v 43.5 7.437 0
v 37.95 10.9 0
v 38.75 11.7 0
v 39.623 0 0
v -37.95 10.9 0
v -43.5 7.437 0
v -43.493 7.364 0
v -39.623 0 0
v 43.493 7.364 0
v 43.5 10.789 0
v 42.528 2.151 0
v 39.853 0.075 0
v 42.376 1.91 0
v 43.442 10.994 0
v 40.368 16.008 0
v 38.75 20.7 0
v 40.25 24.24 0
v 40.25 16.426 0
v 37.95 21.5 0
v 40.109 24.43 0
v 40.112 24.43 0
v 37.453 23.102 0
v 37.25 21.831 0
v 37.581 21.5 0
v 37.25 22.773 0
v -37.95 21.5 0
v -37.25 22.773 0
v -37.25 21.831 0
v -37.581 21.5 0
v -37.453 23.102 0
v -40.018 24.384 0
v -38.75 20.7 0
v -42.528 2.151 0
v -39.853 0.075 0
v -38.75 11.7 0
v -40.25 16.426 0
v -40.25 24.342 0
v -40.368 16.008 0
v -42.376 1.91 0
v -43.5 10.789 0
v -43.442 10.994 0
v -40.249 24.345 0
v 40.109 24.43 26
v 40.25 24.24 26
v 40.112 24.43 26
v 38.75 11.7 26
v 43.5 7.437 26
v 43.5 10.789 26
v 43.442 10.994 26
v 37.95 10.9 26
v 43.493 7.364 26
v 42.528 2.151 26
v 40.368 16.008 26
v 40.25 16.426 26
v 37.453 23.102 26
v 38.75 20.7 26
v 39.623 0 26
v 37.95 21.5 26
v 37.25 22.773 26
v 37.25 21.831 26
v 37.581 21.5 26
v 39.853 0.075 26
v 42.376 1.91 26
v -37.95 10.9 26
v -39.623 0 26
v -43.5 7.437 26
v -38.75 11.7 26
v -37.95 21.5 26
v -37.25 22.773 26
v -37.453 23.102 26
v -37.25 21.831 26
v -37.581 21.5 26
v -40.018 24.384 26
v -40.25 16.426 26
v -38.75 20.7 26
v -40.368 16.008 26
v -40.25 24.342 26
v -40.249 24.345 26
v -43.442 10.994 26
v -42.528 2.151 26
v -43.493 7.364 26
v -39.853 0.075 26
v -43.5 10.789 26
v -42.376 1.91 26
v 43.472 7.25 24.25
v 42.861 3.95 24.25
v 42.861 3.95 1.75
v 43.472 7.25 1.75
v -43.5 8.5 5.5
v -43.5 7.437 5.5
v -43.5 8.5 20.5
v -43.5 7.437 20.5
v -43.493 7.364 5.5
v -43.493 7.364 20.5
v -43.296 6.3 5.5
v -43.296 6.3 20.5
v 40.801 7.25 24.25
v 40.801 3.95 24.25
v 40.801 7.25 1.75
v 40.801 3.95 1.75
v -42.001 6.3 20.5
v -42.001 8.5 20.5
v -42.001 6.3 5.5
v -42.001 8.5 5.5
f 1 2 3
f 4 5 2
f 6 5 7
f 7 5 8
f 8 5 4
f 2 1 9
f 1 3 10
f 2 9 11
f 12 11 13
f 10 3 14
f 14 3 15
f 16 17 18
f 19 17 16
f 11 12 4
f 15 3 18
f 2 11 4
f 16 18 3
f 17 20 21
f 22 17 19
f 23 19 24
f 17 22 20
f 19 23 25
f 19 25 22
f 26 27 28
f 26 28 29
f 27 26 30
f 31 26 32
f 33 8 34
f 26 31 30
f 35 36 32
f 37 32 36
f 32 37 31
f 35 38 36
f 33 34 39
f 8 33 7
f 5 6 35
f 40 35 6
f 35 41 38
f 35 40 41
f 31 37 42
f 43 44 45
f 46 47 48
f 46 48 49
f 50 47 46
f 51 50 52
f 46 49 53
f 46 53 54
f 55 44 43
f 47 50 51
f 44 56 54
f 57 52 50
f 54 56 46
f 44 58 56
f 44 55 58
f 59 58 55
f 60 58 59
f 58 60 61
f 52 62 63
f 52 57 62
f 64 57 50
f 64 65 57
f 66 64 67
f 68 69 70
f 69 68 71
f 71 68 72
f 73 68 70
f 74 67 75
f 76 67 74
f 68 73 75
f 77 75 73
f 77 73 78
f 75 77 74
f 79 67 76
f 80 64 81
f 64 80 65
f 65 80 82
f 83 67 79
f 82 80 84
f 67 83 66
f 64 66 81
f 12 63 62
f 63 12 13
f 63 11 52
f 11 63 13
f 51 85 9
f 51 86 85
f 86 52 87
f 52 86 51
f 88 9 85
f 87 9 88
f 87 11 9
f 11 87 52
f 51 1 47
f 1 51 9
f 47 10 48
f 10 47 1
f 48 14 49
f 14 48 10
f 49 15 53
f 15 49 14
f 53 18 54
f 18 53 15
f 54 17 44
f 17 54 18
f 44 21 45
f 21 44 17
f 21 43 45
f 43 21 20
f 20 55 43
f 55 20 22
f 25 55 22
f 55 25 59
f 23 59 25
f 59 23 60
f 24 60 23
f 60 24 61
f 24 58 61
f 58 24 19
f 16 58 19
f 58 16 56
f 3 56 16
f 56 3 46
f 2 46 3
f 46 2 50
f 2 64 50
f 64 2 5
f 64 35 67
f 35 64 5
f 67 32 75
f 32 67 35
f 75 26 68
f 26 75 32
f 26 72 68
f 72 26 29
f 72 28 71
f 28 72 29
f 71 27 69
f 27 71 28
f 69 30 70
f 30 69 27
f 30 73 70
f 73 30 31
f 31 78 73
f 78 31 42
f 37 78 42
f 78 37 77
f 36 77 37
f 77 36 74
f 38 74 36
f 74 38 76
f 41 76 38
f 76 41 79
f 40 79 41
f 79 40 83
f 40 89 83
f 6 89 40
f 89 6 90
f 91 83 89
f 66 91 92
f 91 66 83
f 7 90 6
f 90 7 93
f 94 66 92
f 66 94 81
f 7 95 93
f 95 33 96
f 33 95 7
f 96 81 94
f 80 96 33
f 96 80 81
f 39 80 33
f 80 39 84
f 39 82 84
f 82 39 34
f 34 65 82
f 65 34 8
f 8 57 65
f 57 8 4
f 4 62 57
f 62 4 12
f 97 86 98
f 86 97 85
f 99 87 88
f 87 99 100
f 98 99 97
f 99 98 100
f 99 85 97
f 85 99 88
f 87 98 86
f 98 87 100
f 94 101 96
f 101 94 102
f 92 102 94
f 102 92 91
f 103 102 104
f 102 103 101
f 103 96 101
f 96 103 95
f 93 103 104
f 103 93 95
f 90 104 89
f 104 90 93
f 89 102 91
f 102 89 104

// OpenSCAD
// file: paths.scad
function sumTo(v,n) = n<=0 ? 0 : v[n-1]+sumTo(v,n-1);
function sum(v) = sumTo(v,len(v));
function interpolationData(v) = let(
    n=len(v)-1,
    d=[for (i=[0:n-1]) norm(v[i]-v[i+1])],
    sumD=[for (i=[0:n]) sumTo(d,i)],
    totalD=sumD[n]) 
        [d,sumD,v,totalD];
function totalLength(interp) = interp[3];
function interpolatePoints(a,b,t) = (1-t)*a+(t)*b;
function findSegmentByDistance(sumD,distance) = let(
    found = [for(i=[0:len(sumD)-1]) if(sumD[i]<=distance && distance<sumD[i+1]) i])
        len(found)>0 ? found[0] : -1;
function interpolateByDistance(interp,distance) = let(
    n=len(interp[1])-1,
    d=interp[0],
    sumD=interp[1],
    v=interp[2],
    totalD=interp[3],
    i=findSegmentByDistance(sumD,distance))
        i<0 ? (distance<totalD/2 ? v[0] : v[n]) :
            interpolatePoints(v[i],v[i+1],(distance-sumD[i])/d[i]);
function get2DNormalBetweenPoints(a,b) = let(
    v = (b-a)/norm(b-a))
        [v[1],-v[0]];
function getTangentByDistance(interp,distance) = let(
    n=len(interp[1])-1,
    d=interp[0],
    sumD=interp[1],
    v=interp[2],
    totalD=interp[3],
    i0=findSegmentByDistance(sumD,distance),
    i = i0 < 0 ? (distance<totalD/2 ? 0 : n-1) : i0)
        (v[i+1]-v[i])/norm(v[i+1]-v[i]);
    
function interpolateByParameter(interp,t) = interpolateByDistance(interp,t*totalLength(interp));
function singleInterpolateByDistance(v,distance) = interpolateByDistance(interpolationData(v),distance);
function singleInterpolateByParameter(v,t) = interpolateByParameter(interpolationData(v),t);
function measurePath(v) = totalLength(interpolationData(v));

function findCoordinateIntersection2(a,b,index,value) = 
    a[index] == value ? a : 
        b[index] == value ? b :
            let( t=(value-a[index]) / (b[index]-a[index]))
                (1-t)*a+t*b;

function findCoordinateIntersections(path,index,value) = 
    [for (i=[0:len(path)-2]) if ((path[i][index]-value)*(path[i+1][index]-value) <= 0) findCoordinateIntersection2(path[i],path[i+1],index,value)];            

function mirrorMatrix(normalVector) = let(v = normalVector/norm(normalVector)) len(v)<3 ? [[1-2*v[0]*v[0],-2*v[0]*v[1]],[-2*v[0]*v[1],1-2*v[1]*v[1]]] : [[1-2*v[0]*v[0],-2*v[0]*v[1],-2*v[0]*v[2]],[-2*v[0]*v[1],1-2*v[1]*v[1],-2*v[1]*v[2]],[-2*v[0]*v[2],-2*v[1]*v[2],1-2*v[2]*v[2]]];

function trimArray(a, n) = [for (i=[0:n-1]) a[i]];

function transformPoint(matrix,a) = 
    let(n=len(a))
        len(matrix[0])==n+1 ? 
            trimArray(matrix * concat(a,[1]), n)
            : matrix * a;

function transformPath(matrix,path) =
    [for (a=path) transformPoint(matrix,a)];

function reverseArray(array) = let(n=len(array)) [for (i=[0:n-1]) array[n-1-i]];

function stitchPaths(a,b) = let(na=len(a)) [for (i=[0:na+len(b)-2]) i<na? a[i] : b[i-na+1]-b[0]+a[na-1]];

//interp = interpolationData([[1,2],[2,3],[1,2]]);
//echo(singleInterpolateByParameter([[1,1],[2,2],[3,1]],0.75));
//echo(measurePath([[1,2],[2,3],[1,2]]));
// main file
use <paths.scad>;

//<params>
b1 = 79.5;
b1a = 85.0;
b2 = 87;
h1a = 2;
rightNubFromBase = 5.6;
rightNubSlitThickness = 3.3;
rightNubSlitLength = 22.5;;
rightNubSlitDepth = 2.7;
leftNubFromBase = 7.4;
leftNubSlitThickness = 2.2;
leftNubSlitLength = 15;
leftNubSlitDepth = 1.5;
fromNubsToPhone = 3.5;
phoneWidth = 77.5;
snapHeight = 10.6;
snapInset = 1.5;
snapThickness = 1.5;
holderWidth = 26;
rounding = 0.8;
//</params>

module dummy() {}

nudge = 0.001;

rightPath = 
  [ [b1/2,0],
    [b1a/2,h1a],
    [b2/2,max(leftNubFromBase,rightNubFromBase)],
    [b2/2,max(leftNubFromBase,rightNubFromBase)+fromNubsToPhone],
    [phoneWidth/2+snapThickness,max(leftNubFromBase,rightNubFromBase)+fromNubsToPhone+snapHeight*0.5],
    [phoneWidth/2+snapThickness,max(leftNubFromBase,rightNubFromBase)+fromNubsToPhone+snapHeight+snapThickness+1.5],
    [phoneWidth/2-snapInset,max(leftNubFromBase,rightNubFromBase)+fromNubsToPhone+snapHeight+snapThickness],
    [phoneWidth/2-snapInset,max(leftNubFromBase,rightNubFromBase)+fromNubsToPhone+snapHeight],
    [phoneWidth/2,max(leftNubFromBase,rightNubFromBase)+fromNubsToPhone+snapHeight],
    [phoneWidth/2,max(leftNubFromBase,rightNubFromBase)+fromNubsToPhone],
    [0, max(leftNubFromBase,rightNubFromBase)+fromNubsToPhone]];
    
    
path = stitchPaths(rightPath,reverseArray(transformPath(mirrorMatrix([1,0]),rightPath)));

module mainHolder() {
    linear_extrude(height=holderWidth) 
offset(r=-rounding) offset(r=rounding) polygon(points=path);
}

module slit(nubFromBase,nubSlitThickness,nubSlitLength,nubSlitDepth) {
    translate([b2/2+nudge-nubSlitDepth,nubFromBase-nubSlitThickness/2,holderWidth/2-nubSlitLength/2])
    cube([nubSlitDepth+nudge,nubSlitThickness,nubSlitLength]);
}

render(convexity=2)
difference() {
    mainHolder();
    slit(rightNubFromBase,rightNubSlitThickness,rightNubSlitLength,rightNubSlitDepth);
    mirror([1,0,0]) slit(leftNubFromBase,leftNubSlitThickness,leftNubSlitLength,leftNubSlitDepth);
}
